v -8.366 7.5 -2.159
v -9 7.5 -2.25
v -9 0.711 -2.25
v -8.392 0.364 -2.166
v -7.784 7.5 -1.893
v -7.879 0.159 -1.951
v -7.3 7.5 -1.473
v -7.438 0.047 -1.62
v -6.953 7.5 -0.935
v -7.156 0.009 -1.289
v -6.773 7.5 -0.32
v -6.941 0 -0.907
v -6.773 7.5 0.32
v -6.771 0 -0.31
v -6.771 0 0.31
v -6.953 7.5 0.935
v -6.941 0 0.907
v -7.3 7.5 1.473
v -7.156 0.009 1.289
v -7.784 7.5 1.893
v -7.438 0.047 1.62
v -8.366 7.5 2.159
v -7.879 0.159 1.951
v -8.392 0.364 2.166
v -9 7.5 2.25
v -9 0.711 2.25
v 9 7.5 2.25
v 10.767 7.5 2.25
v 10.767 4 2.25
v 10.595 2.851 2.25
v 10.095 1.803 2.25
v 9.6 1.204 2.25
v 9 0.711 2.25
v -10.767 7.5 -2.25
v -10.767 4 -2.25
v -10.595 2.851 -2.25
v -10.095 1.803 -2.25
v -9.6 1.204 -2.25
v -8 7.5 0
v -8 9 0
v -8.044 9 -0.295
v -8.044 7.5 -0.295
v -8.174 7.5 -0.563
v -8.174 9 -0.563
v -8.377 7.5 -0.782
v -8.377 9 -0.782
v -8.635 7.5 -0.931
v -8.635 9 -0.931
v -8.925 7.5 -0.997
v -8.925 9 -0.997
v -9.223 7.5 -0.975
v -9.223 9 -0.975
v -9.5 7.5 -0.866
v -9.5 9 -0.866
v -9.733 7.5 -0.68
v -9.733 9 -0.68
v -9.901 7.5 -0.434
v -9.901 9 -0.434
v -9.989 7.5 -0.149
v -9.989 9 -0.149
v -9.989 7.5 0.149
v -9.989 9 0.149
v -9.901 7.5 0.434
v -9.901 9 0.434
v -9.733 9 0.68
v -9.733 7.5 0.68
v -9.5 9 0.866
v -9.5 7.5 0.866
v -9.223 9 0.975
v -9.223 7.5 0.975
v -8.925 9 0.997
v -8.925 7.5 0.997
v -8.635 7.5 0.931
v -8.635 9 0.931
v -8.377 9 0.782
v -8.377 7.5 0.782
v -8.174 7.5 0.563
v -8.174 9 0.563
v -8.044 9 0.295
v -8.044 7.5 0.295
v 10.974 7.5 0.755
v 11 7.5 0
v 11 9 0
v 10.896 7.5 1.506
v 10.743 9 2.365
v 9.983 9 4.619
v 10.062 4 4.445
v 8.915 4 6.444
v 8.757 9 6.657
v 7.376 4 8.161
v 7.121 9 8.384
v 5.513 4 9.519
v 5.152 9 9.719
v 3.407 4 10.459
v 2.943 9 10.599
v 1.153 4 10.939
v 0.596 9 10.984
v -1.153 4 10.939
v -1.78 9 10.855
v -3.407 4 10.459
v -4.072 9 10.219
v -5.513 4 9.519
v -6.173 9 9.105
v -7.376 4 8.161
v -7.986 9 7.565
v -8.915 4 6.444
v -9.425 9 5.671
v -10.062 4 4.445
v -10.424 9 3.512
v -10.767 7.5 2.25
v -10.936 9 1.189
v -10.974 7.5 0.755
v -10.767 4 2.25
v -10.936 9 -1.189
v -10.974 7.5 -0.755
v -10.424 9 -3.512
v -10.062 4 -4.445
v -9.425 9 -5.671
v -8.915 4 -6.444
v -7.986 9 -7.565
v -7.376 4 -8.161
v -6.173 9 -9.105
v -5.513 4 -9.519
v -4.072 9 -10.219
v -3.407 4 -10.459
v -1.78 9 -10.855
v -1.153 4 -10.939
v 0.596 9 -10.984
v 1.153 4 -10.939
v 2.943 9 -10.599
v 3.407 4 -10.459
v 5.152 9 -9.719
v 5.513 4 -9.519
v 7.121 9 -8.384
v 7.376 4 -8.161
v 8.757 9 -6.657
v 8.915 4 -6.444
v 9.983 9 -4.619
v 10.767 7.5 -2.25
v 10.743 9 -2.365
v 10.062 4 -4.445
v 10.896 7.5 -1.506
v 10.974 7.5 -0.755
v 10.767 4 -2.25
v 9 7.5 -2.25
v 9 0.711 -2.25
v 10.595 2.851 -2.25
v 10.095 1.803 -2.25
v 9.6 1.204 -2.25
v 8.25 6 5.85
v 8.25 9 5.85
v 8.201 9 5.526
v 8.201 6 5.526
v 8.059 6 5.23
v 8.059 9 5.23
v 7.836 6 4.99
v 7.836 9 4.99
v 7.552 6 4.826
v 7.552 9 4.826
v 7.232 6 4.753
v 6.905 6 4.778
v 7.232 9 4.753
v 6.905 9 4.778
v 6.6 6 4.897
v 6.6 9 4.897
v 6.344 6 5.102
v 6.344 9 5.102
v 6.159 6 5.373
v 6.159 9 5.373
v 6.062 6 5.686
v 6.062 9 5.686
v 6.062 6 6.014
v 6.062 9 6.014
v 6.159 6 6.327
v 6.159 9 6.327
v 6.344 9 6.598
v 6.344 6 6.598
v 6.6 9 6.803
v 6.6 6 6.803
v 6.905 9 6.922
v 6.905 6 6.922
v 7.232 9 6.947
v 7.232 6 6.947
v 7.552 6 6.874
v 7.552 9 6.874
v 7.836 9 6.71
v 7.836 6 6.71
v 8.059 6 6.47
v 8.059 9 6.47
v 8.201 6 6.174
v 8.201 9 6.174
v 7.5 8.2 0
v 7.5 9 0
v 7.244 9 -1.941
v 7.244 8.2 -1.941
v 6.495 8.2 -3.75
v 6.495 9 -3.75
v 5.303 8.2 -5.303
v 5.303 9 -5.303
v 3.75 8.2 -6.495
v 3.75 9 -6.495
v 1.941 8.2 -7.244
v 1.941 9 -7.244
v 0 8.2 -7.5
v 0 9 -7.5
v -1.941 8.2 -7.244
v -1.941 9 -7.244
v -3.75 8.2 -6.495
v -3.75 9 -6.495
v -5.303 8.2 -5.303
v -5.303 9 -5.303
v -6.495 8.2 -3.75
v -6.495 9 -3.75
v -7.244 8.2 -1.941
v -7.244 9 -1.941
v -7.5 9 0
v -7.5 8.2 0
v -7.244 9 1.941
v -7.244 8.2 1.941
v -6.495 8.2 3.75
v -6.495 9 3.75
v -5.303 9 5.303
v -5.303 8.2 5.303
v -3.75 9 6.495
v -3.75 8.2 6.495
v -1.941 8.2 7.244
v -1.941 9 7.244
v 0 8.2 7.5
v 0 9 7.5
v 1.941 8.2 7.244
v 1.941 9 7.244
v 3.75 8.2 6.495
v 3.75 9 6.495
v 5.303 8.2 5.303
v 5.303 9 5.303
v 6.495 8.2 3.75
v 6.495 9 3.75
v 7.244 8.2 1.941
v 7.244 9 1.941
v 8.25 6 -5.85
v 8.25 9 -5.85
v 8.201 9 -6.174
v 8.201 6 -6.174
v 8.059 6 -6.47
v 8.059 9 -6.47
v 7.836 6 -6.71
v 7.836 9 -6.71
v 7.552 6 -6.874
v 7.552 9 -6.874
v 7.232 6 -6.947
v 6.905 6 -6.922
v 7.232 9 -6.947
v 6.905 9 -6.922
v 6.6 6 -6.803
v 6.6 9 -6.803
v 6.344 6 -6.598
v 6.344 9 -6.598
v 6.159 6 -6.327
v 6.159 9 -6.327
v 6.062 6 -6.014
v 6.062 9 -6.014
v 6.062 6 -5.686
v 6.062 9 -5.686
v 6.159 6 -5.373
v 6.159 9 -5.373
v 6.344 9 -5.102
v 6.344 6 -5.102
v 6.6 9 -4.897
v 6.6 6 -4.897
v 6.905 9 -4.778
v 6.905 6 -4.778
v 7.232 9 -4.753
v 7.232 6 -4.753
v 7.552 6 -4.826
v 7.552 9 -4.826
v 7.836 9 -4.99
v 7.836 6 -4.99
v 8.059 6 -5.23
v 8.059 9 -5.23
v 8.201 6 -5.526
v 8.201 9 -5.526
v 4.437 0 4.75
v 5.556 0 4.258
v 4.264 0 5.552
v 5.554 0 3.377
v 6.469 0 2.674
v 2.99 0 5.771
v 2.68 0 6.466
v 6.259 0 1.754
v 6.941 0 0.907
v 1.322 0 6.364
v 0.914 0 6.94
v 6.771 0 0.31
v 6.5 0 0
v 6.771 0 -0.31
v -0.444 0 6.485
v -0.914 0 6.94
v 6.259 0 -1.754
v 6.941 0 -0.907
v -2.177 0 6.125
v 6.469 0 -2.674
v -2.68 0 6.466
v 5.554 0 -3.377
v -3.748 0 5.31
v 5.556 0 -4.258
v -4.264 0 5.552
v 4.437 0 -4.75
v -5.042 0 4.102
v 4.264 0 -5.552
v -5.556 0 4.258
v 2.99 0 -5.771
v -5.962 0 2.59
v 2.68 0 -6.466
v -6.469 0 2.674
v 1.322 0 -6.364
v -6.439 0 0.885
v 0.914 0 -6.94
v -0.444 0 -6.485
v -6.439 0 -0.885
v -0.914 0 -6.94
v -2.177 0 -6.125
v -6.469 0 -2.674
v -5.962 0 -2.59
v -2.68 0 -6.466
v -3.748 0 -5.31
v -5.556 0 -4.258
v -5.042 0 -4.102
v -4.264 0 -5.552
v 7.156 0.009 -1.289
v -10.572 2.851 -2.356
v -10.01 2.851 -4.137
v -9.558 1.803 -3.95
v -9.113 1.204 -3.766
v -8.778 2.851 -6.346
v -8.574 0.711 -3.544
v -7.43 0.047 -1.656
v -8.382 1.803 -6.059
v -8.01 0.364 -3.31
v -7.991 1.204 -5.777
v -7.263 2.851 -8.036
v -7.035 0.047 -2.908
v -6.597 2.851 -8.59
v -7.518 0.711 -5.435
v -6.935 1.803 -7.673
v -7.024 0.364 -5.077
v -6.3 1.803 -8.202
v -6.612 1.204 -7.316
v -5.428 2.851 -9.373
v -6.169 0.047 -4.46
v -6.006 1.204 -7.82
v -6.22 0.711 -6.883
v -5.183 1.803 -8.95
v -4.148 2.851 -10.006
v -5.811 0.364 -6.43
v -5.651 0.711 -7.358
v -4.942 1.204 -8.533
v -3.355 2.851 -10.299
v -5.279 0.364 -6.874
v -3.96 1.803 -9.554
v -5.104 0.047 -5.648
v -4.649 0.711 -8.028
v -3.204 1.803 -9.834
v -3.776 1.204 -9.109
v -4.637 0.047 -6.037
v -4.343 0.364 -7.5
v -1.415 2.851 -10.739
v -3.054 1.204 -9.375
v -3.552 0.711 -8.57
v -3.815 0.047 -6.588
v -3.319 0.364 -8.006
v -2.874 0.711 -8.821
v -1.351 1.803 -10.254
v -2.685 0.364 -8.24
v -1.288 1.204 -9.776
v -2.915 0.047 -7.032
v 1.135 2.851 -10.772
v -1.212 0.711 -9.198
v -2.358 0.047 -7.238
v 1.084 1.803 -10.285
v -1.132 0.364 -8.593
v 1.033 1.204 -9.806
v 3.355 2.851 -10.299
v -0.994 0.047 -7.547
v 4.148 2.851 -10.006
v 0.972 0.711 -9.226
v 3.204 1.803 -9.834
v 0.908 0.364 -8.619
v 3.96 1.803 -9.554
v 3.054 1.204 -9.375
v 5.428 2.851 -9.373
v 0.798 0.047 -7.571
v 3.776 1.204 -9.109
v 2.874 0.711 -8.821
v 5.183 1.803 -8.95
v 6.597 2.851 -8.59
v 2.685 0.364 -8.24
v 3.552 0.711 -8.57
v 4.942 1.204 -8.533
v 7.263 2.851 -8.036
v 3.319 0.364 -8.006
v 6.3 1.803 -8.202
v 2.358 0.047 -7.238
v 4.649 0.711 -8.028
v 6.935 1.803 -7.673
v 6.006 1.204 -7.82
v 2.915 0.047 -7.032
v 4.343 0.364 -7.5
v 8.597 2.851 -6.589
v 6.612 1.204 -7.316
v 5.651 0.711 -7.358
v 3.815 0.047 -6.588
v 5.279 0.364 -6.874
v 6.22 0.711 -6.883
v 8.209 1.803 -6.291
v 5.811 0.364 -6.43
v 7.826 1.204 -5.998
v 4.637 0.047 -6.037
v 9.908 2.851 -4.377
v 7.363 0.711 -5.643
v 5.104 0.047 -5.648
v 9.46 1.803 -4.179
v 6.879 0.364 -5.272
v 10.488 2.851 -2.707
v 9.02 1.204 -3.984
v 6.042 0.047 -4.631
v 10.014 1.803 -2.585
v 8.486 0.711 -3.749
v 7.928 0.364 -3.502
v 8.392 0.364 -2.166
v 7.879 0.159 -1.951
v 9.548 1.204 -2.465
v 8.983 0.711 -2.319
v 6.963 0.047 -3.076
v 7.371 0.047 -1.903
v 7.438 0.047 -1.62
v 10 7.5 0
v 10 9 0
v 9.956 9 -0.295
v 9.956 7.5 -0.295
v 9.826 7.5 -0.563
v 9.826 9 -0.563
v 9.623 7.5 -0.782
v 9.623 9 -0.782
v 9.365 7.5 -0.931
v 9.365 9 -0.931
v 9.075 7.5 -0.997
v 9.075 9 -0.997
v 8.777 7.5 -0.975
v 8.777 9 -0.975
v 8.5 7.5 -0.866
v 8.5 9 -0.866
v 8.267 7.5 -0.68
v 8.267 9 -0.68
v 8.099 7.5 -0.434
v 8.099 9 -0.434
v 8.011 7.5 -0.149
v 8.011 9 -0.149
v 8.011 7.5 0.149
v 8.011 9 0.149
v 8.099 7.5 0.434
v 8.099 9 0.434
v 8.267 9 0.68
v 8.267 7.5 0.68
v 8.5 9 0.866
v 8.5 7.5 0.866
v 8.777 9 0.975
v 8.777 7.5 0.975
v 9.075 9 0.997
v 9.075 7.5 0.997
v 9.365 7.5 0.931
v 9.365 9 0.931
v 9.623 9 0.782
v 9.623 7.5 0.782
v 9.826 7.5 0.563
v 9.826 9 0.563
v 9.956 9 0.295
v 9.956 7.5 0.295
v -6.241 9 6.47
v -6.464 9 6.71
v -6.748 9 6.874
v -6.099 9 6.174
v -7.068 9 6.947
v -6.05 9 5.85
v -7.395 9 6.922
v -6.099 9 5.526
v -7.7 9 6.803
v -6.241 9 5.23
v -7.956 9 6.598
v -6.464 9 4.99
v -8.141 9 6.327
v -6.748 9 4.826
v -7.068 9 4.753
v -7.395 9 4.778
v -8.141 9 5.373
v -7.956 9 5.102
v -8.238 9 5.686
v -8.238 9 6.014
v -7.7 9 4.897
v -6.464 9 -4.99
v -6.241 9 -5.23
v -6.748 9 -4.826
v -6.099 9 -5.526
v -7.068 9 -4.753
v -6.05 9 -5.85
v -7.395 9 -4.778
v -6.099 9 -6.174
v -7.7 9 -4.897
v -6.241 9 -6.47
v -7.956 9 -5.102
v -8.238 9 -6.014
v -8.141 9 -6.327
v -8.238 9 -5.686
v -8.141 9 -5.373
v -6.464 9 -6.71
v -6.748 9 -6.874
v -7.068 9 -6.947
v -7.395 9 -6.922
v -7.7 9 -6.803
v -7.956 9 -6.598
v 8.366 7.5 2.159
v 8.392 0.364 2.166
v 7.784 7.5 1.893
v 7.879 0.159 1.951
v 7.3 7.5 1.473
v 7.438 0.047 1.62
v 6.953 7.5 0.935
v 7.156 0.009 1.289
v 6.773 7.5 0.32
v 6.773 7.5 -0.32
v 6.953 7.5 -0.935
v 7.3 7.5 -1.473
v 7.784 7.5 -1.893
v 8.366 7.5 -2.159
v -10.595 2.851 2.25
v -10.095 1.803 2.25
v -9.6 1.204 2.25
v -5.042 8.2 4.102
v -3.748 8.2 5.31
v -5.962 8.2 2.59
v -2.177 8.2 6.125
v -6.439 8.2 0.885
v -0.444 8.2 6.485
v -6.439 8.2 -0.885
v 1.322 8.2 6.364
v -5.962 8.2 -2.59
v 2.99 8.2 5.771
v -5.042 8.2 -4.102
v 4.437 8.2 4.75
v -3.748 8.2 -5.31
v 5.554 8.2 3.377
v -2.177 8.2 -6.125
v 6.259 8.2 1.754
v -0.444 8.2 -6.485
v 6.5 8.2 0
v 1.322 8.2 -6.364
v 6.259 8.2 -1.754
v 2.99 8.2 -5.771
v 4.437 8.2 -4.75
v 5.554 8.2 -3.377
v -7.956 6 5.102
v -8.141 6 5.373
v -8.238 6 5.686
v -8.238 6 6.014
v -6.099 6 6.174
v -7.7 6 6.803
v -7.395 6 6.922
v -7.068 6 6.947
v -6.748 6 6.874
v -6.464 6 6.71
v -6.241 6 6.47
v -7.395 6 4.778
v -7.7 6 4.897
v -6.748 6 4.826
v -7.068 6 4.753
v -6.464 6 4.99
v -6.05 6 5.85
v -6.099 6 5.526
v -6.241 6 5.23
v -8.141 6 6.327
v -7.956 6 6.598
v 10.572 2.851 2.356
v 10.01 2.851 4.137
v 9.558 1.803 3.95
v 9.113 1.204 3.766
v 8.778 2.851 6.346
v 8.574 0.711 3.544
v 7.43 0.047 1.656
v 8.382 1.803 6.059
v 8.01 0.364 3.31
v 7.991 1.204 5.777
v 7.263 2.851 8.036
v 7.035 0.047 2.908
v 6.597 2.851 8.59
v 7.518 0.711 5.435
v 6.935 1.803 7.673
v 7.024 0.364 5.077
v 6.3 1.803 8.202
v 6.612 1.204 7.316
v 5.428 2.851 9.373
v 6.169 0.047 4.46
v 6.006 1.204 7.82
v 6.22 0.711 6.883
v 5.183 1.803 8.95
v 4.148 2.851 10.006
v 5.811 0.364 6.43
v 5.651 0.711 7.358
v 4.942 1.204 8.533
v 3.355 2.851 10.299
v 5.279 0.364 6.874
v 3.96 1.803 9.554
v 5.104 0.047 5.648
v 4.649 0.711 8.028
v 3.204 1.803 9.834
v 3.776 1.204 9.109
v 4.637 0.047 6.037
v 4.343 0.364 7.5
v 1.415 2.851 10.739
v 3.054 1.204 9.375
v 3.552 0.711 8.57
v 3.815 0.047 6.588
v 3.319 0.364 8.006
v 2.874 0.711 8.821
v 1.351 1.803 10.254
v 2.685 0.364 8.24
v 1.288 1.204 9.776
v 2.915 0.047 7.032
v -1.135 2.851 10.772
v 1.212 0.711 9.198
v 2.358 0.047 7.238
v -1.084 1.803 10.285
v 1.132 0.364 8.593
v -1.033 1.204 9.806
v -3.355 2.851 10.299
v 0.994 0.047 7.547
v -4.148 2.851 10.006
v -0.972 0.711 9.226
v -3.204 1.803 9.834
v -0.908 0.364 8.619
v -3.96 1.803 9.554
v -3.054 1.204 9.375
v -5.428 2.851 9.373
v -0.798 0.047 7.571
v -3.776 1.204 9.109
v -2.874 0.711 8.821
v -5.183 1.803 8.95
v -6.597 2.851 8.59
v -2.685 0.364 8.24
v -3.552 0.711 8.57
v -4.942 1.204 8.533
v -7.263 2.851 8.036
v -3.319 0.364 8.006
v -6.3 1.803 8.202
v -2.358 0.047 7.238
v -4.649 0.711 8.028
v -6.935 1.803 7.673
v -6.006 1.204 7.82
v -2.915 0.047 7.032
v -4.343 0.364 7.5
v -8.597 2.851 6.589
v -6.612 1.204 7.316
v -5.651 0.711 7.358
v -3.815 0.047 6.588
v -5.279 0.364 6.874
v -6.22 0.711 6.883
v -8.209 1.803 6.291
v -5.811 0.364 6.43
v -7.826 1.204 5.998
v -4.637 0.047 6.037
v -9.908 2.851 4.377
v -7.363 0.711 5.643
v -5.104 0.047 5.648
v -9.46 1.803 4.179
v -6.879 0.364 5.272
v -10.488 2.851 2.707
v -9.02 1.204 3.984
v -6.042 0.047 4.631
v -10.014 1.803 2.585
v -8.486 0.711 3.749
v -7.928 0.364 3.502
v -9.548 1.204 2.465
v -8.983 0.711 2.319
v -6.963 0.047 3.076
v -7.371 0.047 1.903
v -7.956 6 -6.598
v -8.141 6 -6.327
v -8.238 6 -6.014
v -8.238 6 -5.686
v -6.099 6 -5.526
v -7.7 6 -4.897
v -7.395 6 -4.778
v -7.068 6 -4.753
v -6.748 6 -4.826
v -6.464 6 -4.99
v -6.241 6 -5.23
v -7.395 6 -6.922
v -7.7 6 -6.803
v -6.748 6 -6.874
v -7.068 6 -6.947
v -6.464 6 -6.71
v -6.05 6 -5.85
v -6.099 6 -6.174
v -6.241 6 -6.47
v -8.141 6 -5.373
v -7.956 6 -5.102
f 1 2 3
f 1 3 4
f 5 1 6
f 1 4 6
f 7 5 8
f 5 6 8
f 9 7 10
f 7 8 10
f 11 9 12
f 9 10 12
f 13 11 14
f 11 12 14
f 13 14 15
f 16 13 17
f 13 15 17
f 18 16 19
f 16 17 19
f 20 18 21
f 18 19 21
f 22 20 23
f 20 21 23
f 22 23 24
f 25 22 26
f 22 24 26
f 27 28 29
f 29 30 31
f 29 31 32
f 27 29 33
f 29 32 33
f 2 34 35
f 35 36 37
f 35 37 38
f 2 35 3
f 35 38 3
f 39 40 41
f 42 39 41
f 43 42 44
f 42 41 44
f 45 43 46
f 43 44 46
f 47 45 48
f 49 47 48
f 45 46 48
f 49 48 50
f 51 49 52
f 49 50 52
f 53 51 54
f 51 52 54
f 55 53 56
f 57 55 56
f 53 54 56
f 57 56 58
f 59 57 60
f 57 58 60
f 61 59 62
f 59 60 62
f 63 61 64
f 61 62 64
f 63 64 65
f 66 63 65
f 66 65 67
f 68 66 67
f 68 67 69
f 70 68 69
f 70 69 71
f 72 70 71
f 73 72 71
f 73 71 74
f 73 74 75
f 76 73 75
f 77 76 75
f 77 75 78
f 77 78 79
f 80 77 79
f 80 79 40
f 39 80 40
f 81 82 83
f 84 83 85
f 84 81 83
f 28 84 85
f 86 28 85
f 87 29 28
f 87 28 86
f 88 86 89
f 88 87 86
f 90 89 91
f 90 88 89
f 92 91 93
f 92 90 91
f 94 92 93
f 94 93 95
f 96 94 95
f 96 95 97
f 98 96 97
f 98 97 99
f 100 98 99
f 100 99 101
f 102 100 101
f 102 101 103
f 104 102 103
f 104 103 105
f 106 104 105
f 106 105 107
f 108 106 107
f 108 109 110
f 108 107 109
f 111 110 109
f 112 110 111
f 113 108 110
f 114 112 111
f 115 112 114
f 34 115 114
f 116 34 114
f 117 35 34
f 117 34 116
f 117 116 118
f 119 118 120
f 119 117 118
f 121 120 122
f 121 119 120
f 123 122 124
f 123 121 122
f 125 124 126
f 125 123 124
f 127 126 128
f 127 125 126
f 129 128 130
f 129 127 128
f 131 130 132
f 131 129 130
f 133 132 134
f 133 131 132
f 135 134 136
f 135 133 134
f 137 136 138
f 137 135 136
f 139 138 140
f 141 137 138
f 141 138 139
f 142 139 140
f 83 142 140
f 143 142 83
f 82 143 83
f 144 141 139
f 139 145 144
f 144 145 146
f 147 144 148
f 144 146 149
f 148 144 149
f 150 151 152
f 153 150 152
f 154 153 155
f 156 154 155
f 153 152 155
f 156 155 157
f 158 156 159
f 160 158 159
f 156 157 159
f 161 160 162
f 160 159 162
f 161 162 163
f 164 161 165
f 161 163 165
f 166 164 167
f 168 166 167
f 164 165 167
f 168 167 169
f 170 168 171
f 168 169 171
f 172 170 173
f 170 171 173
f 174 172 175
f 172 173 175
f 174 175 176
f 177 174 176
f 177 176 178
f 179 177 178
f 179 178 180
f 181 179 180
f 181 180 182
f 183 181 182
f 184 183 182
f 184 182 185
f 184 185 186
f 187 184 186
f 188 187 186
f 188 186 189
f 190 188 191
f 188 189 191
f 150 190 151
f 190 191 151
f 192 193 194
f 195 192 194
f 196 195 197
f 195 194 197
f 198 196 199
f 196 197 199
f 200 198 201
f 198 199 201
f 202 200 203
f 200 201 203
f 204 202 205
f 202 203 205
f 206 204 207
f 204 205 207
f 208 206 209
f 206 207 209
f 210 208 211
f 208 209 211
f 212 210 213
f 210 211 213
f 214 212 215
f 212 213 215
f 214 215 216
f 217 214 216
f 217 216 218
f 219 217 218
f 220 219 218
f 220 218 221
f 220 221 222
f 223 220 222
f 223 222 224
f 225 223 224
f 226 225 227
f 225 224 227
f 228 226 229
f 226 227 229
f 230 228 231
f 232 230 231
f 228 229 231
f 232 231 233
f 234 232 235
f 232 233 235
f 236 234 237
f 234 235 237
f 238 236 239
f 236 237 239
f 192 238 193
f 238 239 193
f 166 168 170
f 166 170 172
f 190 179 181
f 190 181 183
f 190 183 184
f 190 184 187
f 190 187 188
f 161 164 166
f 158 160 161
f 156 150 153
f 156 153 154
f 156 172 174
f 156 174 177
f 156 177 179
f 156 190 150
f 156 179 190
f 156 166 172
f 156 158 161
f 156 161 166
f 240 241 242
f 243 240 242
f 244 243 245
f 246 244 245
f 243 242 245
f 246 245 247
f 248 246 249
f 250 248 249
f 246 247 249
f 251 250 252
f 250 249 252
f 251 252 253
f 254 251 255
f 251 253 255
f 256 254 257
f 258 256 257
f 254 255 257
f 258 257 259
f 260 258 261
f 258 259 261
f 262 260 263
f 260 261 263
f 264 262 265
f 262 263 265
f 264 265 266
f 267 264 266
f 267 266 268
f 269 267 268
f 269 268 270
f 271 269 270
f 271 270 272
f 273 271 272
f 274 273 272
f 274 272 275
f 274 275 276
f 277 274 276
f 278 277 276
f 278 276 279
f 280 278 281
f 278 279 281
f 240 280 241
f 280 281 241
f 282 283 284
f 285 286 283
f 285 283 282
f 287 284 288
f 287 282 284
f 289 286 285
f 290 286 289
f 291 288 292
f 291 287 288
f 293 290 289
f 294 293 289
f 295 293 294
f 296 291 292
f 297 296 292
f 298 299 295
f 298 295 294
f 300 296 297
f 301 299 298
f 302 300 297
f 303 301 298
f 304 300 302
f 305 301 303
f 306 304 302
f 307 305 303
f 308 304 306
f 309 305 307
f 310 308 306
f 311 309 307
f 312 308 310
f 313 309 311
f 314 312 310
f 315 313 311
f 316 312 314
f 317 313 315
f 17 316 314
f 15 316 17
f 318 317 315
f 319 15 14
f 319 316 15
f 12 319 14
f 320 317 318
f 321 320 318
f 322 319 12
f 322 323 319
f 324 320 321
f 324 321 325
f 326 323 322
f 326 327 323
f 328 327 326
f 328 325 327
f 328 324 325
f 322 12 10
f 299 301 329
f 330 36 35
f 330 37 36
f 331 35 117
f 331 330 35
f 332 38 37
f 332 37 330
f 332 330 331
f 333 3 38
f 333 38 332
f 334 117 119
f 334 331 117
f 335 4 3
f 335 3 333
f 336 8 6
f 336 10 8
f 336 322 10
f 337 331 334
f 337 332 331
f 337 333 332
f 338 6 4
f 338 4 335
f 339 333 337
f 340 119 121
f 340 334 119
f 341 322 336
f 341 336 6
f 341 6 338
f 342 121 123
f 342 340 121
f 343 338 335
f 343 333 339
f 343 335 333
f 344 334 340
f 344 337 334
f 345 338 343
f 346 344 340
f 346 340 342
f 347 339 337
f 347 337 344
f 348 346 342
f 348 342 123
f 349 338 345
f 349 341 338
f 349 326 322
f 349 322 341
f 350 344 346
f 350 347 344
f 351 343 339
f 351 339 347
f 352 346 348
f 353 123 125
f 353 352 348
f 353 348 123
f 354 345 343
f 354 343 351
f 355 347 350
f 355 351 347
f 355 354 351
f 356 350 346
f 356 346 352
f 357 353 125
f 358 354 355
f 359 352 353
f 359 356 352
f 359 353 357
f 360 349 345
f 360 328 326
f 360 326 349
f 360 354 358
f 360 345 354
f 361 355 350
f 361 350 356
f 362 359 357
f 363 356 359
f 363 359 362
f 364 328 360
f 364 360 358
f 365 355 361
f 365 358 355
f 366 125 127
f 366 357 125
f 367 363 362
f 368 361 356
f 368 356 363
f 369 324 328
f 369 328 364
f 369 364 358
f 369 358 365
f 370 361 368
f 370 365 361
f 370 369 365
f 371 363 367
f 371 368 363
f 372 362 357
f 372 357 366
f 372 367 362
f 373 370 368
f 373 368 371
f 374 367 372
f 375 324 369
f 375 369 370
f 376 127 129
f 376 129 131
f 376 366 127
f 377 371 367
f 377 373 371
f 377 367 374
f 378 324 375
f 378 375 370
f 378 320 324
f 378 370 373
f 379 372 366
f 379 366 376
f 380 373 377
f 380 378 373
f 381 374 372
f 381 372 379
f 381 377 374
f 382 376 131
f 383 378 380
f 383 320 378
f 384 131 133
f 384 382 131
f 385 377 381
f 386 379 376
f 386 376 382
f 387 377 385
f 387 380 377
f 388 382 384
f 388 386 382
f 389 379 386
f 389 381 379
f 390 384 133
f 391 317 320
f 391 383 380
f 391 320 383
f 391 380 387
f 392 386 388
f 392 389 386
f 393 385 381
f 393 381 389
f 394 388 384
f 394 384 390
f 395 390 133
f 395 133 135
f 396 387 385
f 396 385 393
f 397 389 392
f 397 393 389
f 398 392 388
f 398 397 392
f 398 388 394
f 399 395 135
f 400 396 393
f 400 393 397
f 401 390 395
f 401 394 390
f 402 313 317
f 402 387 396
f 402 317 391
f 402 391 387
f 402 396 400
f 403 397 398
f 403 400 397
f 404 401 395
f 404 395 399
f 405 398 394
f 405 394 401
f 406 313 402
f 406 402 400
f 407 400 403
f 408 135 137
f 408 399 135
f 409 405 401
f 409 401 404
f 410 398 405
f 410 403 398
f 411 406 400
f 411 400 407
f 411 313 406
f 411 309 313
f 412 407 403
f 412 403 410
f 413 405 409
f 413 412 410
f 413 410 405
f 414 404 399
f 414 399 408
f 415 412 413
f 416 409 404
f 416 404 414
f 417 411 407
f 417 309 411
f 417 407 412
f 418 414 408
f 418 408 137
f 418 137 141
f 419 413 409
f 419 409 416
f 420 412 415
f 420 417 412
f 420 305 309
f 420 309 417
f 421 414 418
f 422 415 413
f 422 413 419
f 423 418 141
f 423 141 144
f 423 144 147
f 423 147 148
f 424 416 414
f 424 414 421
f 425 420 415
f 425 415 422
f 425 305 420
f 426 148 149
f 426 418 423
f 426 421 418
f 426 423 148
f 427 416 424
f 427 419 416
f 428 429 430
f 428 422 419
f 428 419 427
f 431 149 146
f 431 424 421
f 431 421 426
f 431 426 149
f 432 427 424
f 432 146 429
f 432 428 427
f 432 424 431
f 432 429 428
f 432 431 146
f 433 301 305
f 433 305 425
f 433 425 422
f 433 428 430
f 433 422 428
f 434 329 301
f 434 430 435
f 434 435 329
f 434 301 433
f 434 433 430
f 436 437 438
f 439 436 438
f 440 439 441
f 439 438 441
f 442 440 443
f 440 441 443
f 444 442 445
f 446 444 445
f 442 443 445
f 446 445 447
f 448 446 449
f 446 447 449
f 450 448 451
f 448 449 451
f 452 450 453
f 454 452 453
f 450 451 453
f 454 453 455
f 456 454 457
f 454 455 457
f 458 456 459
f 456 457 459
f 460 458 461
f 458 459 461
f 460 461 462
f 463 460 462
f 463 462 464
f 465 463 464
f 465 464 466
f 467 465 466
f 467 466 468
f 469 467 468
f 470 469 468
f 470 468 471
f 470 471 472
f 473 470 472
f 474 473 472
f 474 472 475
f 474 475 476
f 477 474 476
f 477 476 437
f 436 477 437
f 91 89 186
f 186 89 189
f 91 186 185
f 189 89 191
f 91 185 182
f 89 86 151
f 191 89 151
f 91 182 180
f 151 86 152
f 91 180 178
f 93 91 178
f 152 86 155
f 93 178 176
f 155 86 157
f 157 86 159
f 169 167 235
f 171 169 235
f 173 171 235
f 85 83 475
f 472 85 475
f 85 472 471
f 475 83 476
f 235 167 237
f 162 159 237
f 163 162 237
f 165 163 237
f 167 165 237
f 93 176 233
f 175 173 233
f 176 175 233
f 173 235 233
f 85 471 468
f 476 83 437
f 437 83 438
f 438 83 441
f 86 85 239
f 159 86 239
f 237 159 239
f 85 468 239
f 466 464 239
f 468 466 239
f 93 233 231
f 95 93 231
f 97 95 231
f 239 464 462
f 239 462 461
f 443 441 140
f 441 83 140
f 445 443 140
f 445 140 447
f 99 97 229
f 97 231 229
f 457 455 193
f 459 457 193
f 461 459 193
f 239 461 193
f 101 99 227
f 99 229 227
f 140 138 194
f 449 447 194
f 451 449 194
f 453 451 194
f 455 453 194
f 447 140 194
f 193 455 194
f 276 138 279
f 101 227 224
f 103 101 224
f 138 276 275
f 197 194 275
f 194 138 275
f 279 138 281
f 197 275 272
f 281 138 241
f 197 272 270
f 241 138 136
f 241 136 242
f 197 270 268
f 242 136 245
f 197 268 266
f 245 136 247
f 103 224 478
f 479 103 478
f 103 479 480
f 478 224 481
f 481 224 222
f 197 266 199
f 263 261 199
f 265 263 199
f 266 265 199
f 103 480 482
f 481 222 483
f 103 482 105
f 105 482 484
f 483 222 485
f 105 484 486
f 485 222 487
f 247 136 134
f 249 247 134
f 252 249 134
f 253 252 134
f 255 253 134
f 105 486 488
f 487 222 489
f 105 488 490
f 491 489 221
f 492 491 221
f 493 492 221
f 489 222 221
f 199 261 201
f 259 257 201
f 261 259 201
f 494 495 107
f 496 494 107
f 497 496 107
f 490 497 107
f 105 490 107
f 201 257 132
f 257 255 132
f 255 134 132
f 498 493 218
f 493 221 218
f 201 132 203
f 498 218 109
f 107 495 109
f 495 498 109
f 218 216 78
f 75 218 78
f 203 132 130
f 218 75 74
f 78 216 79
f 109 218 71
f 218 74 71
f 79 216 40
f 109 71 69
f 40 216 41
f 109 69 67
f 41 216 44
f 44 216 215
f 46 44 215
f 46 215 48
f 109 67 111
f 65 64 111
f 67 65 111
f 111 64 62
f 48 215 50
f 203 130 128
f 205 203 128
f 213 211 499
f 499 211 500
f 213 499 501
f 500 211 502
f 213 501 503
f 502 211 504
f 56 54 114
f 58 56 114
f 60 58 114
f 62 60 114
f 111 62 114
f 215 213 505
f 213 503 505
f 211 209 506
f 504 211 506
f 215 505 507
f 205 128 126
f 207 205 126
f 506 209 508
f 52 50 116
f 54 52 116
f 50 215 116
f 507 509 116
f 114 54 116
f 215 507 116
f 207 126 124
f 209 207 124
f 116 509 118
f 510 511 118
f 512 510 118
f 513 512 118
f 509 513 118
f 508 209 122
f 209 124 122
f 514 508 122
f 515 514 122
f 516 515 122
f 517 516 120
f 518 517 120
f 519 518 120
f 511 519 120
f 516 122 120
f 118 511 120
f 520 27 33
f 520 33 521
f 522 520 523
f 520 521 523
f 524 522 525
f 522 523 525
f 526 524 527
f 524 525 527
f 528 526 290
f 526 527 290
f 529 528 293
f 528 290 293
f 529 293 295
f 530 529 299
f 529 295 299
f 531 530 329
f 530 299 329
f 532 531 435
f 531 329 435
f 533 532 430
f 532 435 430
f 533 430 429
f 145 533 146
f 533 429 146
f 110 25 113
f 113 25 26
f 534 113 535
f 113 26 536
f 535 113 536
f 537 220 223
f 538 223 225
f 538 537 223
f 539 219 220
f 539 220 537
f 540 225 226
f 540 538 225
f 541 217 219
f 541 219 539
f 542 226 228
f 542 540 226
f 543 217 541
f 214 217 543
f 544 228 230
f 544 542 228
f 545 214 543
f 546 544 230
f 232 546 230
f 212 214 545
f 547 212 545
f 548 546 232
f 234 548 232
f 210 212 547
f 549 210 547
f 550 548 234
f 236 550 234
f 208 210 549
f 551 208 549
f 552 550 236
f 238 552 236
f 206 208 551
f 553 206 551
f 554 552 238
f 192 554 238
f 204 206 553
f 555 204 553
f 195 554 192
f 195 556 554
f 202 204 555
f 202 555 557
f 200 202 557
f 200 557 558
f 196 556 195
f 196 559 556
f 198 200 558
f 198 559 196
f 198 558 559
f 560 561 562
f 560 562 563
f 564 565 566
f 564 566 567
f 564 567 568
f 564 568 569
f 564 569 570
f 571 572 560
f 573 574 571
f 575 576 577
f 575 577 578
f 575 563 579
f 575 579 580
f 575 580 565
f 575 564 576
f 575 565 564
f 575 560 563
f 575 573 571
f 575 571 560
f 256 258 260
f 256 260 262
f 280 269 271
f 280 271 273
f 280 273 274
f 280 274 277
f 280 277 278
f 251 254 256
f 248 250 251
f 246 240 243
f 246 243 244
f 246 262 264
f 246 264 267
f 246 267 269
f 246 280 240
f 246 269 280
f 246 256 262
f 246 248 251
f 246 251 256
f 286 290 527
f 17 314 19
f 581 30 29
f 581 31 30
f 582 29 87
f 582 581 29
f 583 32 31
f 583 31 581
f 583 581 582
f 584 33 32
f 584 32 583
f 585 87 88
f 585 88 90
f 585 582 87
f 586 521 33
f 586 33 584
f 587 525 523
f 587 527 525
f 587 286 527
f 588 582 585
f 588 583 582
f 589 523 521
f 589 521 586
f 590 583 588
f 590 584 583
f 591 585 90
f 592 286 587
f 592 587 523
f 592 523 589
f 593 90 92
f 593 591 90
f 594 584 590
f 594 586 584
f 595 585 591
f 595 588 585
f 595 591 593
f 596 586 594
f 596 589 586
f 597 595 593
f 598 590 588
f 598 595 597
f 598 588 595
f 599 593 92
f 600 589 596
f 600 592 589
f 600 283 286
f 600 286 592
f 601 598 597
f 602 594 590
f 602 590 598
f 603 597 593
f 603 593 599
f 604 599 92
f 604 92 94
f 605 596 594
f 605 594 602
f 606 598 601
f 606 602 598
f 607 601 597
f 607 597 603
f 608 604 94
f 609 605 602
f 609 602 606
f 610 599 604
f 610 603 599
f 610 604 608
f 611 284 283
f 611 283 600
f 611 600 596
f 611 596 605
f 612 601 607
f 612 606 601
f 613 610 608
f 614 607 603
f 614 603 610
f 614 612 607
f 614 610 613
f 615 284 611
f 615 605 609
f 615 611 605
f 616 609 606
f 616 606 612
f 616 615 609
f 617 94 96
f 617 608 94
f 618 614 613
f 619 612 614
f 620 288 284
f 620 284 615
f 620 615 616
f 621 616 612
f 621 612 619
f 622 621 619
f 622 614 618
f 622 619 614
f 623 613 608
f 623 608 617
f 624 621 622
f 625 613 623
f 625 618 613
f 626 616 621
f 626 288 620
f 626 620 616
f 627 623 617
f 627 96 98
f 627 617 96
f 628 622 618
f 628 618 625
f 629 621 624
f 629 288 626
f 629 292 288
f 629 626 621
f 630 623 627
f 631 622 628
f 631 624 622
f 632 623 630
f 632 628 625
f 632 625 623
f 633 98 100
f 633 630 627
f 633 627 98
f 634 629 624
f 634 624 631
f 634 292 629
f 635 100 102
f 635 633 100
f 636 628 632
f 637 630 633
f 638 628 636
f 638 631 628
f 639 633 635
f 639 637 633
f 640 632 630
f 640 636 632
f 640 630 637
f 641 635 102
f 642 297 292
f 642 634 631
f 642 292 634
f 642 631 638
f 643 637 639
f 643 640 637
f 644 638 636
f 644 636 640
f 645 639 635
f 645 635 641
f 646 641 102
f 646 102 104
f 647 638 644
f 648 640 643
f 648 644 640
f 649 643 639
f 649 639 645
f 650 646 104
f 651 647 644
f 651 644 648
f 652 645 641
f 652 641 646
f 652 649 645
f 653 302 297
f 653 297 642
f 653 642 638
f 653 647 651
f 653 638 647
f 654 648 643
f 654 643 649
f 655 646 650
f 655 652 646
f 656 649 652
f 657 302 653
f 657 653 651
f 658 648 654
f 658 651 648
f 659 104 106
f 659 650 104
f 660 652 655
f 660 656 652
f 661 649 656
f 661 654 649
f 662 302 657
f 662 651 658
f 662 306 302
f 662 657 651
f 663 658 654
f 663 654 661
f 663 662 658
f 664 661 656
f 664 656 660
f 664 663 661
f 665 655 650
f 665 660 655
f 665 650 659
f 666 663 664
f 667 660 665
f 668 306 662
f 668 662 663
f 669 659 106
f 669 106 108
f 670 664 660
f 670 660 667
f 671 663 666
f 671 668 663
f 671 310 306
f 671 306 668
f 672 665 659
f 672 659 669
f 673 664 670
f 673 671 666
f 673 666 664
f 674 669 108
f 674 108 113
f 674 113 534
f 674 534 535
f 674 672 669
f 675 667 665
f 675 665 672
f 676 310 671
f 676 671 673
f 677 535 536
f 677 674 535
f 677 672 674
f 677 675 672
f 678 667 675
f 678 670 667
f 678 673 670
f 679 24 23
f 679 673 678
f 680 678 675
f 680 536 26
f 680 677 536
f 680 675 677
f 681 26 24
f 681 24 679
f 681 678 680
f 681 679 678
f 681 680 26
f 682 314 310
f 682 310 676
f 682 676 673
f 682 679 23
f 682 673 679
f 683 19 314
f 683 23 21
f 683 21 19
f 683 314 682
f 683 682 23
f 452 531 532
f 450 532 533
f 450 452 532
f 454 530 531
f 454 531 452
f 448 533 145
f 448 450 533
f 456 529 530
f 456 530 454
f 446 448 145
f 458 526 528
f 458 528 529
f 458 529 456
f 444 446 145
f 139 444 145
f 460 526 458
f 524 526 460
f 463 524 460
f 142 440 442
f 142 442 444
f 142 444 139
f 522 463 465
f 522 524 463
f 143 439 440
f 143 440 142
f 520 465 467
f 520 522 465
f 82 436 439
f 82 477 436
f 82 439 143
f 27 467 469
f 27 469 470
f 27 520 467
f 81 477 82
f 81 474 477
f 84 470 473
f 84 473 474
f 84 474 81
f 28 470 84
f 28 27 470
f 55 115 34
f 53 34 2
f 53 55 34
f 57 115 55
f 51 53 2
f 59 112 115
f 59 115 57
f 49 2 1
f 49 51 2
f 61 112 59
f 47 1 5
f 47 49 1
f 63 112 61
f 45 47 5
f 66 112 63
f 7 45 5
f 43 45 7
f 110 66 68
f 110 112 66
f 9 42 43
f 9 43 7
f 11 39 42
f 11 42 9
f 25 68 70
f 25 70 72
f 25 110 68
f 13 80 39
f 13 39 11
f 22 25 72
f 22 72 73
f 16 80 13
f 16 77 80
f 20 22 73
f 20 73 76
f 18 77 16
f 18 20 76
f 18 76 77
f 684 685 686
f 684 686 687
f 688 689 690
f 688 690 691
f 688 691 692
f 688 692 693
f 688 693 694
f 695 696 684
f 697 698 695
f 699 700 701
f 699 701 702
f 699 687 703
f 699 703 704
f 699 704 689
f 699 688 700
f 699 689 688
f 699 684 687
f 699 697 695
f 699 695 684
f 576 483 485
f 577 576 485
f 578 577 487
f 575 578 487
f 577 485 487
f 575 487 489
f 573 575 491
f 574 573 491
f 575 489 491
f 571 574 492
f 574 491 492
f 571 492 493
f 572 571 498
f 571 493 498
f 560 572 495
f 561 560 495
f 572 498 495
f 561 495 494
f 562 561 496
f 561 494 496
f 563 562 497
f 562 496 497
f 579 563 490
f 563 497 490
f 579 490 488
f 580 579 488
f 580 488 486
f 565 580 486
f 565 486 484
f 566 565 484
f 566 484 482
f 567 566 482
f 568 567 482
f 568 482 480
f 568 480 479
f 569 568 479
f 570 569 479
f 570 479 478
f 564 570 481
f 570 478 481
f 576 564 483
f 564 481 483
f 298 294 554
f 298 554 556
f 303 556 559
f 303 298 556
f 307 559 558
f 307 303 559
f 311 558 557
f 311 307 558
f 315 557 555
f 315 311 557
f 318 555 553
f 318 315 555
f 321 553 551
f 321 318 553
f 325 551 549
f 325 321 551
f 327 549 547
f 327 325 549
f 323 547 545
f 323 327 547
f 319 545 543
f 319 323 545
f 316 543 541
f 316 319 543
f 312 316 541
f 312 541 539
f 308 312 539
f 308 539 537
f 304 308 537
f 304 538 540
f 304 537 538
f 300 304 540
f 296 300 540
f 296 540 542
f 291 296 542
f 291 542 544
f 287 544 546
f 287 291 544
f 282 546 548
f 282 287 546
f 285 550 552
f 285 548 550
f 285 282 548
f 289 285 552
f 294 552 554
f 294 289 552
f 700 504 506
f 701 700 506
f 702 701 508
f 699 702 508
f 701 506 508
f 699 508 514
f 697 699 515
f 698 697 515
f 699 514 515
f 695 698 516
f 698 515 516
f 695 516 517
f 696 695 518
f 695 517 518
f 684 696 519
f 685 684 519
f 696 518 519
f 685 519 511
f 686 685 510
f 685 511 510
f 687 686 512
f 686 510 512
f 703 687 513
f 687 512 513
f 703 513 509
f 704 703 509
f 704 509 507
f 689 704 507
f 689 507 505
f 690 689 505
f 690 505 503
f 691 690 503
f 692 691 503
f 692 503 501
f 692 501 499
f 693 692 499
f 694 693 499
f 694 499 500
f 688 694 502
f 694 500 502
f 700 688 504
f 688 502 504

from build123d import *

# Parameters (mm, degrees)
SKETCH1_R           = 6.5
BOSS_EXTRUDE1_DEPTH = 9
SKETCH2_R           = 1.1
CUT_EXTRUDE1_DEPTH  = 3
SKETCH3_R           = 1
CUT_EXTRUDE2_DEPTH  = 20
CUT_EXTRUDE3_DEPTH  = 7.5
SKETCH6_W           = 6.8
SKETCH6_H           = 6.8
CUT_EXTRUDE4_DEPTH  = 5
SKETCH7_W           = 2.4
SKETCH7_H           = 2.4
CUT_EXTRUDE5_DEPTH  = 5
FILLET2_R           = 4
SKETCH8_R           = 1
CUT_EXTRUDE6_DEPTH  = 20
SKETCH9_R           = 7.5
CUT_EXTRUDE7_DEPTH  = 0.8
SKETCH11_W          = 5
SKETCH11_H          = 1
BOSS_EXTRUDE2_DEPTH = 5
SKETCH12_W          = 53.006357488
SKETCH12_H          = 54.029399369
SKETCH12_R          = 11
CUT_EXTRUDE9_DEPTH  = 10
FILLET3_R           = 4


with BuildPart() as part:
    # Sketch1 → Boss-Extrude1 (new body)
    with BuildSketch(Plane(origin=(0, 0, 0), x_dir=(1, 0, 0), z_dir=(0, 1, 0))):
        with BuildLine():
            Line((-11, 0), (-11, 22.01))
            ThreePointArc((-11, 22.01), (-7.781103525, 29.781103525), (-0.01, 33))
            Line((-0.01, 33), (0.01, 33))
            ThreePointArc((0.01, 33), (7.781103525, 29.781103525), (11, 22.01))
            Line((11, 22.01), (11, 0))
            ThreePointArc((11, 0), (0, -11), (-11, 0))
        make_face()
        Circle(SKETCH1_R, mode=Mode.SUBTRACT)
    extrude(amount=BOSS_EXTRUDE1_DEPTH)

    # Sketch2 → Cut-Extrude1 (cut)
    with BuildSketch(Plane(origin=(0, 9, 0), x_dir=(1, 0, 0), z_dir=(0, 1, 0))):
        with Locations((-7.15, 5.85)):
            Circle(SKETCH2_R)
        with Locations((-7.15, -5.85)):
            Circle(SKETCH2_R)
        with Locations((7.15, -5.85)):
            Circle(SKETCH2_R)
        with Locations((7.15, 5.85)):
            Circle(SKETCH2_R)
    extrude(amount=-CUT_EXTRUDE1_DEPTH, mode=Mode.SUBTRACT)

    # Sketch3 → Cut-Extrude2 (cut)
    with BuildSketch(Plane(origin=(0, 9, 0), x_dir=(1, 0, 0), z_dir=(0, 1, 0))):
        with Locations((-9, 0)):
            Circle(SKETCH3_R)
        with Locations((9, 0)):
            Circle(SKETCH3_R)
    extrude(amount=-CUT_EXTRUDE2_DEPTH, mode=Mode.SUBTRACT)

    # Sketch4 → Cut-Extrude3 (cut)
    with BuildSketch(Plane.XZ):
        with BuildLine():
            Line((-9, 2.25), (-10.767427734, 2.25))
            Line((-10.767427734, 2.25), (-12, 0))
            Line((-12, 0), (-11, -2.25))
            Line((-11, -2.25), (-9, -2.25))
            ThreePointArc((-9, -2.25), (-6.75, 0), (-9, 2.25))
        make_face()
        with BuildLine():
            Line((12, 0), (10.767427734, 2.25))
            Line((10.767427734, 2.25), (9, 2.25))
            ThreePointArc((9, 2.25), (6.75, 0), (9, -2.25))
            Line((9, -2.25), (11, -2.25))
            Line((11, -2.25), (12, 0))
        make_face()
    extrude(amount=-CUT_EXTRUDE3_DEPTH, mode=Mode.SUBTRACT)

    # Sketch6 → Cut-Extrude4 (cut)
    with BuildSketch(Plane.XZ):
        with Locations((0, -22.01)):
            Rectangle(SKETCH6_W, SKETCH6_H)
    extrude(amount=-CUT_EXTRUDE4_DEPTH, mode=Mode.SUBTRACT)

    # Sketch7 → Cut-Extrude5 (cut)
    with BuildSketch(Plane.XZ.offset(-5)):
        with Locations((2.2, -19.81)):
            Rectangle(SKETCH7_W, SKETCH7_H)
        with Locations((-2.2, -19.81)):
            Rectangle(SKETCH7_W, SKETCH7_H)
        with Locations((2.2, -24.21)):
            Rectangle(SKETCH7_W, SKETCH7_H)
        with Locations((-2.2, -24.21)):
            Rectangle(SKETCH7_W, SKETCH7_H)
    extrude(amount=-CUT_EXTRUDE5_DEPTH, mode=Mode.SUBTRACT)

    # Fillet2
    fillet2_edges = [part.edges().sort_by_distance(p)[0] for p in [
        (0, 0, 11),
    ]]
    fillet(fillet2_edges, radius=FILLET2_R)

    # Sketch8 → Cut-Extrude6 (cut)
    with BuildSketch(Plane.XZ):
        with Locations((-9, -22.01)):
            Circle(SKETCH8_R)
        with Locations((9, -22.01)):
            Circle(SKETCH8_R)
    extrude(amount=-CUT_EXTRUDE6_DEPTH, mode=Mode.SUBTRACT)

    # Sketch9 → Cut-Extrude7 (cut)
    with BuildSketch(Plane(origin=(0, 9, 0), x_dir=(1, 0, 0), z_dir=(0, 1, 0))):
        Circle(SKETCH9_R)
    extrude(amount=-CUT_EXTRUDE7_DEPTH, mode=Mode.SUBTRACT)

    # Sketch11 → Boss-Extrude2 (add)
    with BuildSketch(Plane.ZY.offset(-3.4)):
        with Locations((-14.185057965, 8.5)):
            Rectangle(SKETCH11_W, SKETCH11_H)
    extrude(amount=BOSS_EXTRUDE2_DEPTH)

    # Sketch12 → Cut-Extrude9 (cut)
    with BuildSketch(Plane.XZ):
        with Locations((2.65351488, -12.086981999)):
            Rectangle(SKETCH12_W, SKETCH12_H)
        Circle(SKETCH12_R, mode=Mode.SUBTRACT)
    extrude(amount=-CUT_EXTRUDE9_DEPTH, mode=Mode.SUBTRACT)

    # Fillet3
    fillet3_edges = [part.edges().sort_by_distance(p)[0] for p in [
        (0, 0, -11),
    ]]
    fillet(fillet3_edges, radius=FILLET3_R)


solid = part.part
